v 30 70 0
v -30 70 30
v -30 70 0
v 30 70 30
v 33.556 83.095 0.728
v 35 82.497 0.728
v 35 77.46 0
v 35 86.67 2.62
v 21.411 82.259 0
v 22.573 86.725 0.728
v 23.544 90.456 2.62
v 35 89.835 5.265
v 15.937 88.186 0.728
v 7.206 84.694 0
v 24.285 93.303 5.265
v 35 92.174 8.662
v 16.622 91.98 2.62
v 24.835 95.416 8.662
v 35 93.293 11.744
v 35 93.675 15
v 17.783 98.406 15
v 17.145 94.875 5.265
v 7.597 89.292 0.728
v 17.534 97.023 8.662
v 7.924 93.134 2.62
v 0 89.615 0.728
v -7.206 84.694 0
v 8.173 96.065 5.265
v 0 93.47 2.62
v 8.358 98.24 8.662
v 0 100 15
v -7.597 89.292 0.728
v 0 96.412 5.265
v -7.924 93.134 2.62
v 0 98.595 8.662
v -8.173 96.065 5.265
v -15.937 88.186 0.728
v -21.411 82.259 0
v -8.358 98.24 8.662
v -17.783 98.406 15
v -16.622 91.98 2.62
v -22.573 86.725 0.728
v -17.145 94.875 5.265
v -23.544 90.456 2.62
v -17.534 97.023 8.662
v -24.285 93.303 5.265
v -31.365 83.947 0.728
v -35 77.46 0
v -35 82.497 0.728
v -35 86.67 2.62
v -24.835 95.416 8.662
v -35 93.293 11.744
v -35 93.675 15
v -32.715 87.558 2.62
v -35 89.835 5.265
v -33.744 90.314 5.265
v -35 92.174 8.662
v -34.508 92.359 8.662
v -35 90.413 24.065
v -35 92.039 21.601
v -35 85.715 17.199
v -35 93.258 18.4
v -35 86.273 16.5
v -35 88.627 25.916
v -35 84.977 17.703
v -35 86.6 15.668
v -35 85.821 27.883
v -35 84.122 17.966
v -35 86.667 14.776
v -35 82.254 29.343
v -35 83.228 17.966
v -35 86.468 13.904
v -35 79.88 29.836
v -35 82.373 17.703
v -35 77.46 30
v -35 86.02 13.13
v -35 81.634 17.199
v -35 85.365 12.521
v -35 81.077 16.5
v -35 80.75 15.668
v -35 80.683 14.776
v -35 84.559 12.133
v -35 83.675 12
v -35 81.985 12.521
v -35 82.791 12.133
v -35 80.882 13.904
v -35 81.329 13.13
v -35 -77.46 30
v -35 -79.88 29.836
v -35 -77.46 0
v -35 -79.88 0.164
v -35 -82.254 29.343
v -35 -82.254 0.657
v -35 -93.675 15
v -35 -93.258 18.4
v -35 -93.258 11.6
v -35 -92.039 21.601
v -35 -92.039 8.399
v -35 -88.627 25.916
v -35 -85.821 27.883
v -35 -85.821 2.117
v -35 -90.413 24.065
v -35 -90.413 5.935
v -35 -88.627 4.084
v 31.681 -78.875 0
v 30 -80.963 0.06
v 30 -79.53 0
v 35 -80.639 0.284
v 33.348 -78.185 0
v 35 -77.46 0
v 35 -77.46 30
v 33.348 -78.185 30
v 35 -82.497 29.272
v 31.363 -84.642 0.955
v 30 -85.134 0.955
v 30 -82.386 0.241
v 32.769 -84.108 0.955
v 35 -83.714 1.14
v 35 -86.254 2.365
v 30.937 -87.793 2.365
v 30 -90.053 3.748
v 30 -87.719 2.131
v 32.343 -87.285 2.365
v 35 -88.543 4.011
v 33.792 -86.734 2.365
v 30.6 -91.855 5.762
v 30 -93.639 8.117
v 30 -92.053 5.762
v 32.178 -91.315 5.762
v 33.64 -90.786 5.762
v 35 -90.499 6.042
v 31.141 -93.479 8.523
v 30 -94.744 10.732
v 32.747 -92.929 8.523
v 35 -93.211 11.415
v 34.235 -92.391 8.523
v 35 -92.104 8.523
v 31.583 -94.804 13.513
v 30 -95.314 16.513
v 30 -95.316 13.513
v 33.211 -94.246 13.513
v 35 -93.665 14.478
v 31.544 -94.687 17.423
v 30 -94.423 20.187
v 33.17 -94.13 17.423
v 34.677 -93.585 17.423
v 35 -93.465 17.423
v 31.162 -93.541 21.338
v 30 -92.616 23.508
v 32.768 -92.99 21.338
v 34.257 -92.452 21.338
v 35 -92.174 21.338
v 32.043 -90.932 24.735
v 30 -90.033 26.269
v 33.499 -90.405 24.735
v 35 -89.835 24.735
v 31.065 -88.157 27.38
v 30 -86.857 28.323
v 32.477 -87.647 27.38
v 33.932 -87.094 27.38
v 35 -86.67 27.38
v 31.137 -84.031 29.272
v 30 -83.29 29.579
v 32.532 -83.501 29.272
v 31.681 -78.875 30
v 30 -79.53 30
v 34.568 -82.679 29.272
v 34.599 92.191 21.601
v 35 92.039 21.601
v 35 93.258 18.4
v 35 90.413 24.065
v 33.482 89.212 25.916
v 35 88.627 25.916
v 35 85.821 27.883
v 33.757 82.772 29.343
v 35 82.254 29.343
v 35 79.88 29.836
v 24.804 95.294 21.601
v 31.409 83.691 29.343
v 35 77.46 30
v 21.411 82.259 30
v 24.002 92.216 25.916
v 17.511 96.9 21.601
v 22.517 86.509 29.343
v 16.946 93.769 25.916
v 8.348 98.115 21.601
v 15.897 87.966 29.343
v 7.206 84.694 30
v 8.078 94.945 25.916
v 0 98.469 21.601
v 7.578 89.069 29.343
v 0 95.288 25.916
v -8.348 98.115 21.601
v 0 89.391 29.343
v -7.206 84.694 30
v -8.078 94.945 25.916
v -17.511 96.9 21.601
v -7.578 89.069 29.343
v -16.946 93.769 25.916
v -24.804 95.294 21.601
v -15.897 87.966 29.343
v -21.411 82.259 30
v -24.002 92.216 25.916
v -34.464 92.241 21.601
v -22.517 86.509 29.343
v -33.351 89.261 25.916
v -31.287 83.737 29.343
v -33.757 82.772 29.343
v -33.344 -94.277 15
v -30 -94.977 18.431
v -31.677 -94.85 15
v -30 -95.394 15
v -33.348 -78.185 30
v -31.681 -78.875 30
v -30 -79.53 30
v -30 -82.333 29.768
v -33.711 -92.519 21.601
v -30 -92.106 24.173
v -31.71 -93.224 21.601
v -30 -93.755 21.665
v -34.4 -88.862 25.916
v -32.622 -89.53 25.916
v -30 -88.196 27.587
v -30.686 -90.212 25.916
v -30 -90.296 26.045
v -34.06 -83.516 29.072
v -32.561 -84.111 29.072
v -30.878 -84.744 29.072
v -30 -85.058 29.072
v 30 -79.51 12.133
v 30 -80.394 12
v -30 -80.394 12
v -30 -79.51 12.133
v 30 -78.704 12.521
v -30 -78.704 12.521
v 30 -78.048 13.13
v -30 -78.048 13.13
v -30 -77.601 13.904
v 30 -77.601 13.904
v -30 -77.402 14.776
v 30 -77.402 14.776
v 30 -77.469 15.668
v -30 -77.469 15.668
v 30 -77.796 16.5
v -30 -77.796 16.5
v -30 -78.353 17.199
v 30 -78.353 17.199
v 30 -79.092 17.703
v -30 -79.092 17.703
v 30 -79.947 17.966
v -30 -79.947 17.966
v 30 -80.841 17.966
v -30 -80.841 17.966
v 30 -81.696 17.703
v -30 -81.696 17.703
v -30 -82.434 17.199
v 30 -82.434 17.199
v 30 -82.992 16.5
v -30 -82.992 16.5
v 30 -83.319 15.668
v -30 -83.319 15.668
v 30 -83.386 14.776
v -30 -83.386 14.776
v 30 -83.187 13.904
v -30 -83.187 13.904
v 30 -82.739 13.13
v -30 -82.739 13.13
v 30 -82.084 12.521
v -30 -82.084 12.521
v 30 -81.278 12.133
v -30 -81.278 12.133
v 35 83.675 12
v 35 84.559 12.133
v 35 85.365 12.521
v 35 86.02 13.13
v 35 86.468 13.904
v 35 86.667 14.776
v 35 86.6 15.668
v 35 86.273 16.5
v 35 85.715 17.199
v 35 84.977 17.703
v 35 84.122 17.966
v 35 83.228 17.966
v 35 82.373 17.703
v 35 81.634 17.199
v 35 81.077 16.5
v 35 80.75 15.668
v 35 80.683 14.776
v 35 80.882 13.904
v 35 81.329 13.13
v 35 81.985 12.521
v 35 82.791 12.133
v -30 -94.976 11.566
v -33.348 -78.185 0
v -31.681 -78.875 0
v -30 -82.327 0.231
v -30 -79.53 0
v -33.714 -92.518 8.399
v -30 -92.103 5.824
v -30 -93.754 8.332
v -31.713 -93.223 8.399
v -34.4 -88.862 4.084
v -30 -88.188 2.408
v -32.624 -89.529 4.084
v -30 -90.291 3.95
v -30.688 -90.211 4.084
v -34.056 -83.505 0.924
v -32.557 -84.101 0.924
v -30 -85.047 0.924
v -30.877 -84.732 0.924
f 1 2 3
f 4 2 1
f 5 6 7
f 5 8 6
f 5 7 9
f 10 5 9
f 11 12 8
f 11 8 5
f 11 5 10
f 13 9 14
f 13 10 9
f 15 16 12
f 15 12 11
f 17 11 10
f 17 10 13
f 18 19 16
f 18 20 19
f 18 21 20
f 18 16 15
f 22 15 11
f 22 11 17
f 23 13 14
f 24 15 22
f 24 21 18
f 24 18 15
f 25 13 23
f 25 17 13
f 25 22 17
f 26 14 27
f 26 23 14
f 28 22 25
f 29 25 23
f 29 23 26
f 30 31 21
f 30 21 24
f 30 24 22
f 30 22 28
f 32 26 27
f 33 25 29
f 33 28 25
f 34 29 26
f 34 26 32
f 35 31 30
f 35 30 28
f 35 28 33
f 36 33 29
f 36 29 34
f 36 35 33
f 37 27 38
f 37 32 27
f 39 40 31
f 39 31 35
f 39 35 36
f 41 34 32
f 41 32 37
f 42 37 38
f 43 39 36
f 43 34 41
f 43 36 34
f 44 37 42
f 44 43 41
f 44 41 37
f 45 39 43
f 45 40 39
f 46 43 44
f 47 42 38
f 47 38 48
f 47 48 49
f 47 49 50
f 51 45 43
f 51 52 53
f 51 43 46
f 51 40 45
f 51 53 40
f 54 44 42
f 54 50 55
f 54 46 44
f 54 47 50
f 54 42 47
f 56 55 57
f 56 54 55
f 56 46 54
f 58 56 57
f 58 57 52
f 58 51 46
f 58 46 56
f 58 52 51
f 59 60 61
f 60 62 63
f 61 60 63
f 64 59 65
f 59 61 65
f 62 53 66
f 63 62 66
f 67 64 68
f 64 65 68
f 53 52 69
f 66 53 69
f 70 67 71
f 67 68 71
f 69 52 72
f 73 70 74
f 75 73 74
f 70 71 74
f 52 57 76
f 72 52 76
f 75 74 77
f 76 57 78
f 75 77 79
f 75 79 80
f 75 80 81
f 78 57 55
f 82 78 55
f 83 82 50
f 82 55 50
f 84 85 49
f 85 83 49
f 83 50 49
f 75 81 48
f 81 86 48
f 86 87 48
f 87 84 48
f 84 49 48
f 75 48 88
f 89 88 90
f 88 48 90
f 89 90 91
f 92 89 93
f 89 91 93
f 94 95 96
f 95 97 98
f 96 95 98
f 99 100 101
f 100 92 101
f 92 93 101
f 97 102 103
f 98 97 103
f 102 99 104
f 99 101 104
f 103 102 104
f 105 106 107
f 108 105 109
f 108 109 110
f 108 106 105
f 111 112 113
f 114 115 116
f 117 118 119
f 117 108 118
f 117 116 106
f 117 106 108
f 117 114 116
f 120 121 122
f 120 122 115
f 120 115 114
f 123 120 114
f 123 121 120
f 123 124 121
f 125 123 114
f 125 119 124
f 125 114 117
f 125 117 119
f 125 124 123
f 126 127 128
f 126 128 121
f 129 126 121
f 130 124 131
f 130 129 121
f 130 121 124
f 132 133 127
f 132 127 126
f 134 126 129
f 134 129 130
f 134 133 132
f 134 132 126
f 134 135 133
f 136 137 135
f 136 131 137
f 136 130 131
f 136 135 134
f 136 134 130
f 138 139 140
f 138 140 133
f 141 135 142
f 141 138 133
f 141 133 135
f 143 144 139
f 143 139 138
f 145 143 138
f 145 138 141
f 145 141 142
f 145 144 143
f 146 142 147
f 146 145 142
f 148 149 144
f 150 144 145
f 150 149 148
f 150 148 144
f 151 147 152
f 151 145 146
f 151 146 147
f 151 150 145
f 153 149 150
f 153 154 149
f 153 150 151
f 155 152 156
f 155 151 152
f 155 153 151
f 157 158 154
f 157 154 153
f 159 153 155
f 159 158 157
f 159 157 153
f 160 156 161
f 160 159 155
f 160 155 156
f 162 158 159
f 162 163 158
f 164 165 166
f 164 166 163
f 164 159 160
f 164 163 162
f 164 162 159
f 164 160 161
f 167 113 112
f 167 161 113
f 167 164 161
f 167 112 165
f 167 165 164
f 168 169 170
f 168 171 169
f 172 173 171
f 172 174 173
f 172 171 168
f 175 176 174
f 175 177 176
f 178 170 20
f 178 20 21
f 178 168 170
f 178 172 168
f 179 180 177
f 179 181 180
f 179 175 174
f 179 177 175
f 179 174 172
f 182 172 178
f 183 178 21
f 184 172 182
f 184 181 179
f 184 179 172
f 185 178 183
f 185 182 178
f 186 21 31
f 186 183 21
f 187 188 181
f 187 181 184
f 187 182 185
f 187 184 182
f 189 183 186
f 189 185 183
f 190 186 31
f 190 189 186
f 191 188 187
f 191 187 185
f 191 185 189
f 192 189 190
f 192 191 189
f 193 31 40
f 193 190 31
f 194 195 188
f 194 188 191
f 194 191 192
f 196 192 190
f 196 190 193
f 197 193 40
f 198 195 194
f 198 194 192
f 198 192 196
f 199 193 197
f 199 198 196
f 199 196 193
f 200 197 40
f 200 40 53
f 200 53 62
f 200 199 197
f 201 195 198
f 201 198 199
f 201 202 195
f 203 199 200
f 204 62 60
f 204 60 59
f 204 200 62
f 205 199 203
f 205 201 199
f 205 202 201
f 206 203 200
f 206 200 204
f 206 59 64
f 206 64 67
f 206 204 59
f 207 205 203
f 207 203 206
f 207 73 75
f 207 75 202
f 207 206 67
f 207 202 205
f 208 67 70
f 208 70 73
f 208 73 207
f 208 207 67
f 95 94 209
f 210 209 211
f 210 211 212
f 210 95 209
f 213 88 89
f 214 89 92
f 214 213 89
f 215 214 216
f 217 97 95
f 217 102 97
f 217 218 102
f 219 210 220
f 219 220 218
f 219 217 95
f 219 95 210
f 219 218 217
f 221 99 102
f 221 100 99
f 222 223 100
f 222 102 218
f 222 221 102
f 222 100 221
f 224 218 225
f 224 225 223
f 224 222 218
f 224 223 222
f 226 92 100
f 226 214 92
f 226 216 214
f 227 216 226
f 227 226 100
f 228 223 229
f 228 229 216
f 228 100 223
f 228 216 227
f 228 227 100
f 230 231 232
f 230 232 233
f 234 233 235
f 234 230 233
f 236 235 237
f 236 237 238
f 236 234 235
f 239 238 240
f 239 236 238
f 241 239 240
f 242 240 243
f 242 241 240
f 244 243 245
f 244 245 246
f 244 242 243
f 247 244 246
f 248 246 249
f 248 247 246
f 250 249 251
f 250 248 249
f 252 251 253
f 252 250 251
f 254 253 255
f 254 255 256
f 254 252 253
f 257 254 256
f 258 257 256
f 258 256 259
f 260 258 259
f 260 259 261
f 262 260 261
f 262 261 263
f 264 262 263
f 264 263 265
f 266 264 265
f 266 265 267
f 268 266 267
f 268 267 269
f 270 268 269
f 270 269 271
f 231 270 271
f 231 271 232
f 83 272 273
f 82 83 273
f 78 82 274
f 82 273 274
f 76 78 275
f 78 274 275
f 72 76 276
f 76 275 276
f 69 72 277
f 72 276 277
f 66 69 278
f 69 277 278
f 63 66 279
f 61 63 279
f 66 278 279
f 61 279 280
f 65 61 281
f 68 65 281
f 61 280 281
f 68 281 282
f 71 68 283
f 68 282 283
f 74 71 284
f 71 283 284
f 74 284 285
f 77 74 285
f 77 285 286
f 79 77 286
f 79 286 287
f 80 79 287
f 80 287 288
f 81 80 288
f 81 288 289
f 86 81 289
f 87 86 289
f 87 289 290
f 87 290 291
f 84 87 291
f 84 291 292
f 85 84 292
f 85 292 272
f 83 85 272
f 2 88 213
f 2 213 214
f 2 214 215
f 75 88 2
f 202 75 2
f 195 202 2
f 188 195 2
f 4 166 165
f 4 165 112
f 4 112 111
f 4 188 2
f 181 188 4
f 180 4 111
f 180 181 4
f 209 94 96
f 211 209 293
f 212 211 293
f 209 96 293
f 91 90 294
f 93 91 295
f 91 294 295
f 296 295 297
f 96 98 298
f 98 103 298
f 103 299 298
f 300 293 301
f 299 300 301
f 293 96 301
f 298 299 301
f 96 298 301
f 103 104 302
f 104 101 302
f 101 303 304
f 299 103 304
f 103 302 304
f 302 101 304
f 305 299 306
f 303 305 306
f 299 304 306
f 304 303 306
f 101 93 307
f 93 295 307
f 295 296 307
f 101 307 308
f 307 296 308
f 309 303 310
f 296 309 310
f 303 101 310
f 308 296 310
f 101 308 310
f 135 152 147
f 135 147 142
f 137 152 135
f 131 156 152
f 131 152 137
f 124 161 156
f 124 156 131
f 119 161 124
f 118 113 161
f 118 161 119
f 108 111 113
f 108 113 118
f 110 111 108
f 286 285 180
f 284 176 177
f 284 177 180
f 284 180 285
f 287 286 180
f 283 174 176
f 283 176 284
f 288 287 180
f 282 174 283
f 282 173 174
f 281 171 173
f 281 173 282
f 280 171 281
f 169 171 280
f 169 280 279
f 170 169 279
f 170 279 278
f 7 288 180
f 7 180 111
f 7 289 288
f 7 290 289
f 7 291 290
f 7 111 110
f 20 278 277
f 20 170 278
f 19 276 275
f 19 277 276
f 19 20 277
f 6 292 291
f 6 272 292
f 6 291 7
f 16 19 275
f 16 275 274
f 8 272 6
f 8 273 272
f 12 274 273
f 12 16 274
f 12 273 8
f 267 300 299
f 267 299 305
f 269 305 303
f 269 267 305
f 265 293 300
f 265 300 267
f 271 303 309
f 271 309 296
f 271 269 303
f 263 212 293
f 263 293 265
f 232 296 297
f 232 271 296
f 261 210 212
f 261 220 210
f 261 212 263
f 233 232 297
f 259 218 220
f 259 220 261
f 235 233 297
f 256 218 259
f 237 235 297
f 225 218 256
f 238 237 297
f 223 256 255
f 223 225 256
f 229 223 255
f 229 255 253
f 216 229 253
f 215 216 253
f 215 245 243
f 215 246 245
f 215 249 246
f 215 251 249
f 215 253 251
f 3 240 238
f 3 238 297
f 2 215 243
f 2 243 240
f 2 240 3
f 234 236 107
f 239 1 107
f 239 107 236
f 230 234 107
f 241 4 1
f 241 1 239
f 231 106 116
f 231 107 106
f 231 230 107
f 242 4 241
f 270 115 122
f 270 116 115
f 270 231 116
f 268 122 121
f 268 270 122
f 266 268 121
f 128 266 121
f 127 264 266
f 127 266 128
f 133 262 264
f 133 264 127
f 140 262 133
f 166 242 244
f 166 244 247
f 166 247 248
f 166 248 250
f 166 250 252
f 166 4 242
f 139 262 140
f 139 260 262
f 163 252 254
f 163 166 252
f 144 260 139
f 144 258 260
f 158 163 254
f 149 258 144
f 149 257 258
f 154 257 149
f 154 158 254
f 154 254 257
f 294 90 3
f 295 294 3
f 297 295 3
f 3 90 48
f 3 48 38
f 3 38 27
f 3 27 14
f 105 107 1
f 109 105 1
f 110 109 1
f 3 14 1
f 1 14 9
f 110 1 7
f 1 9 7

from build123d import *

# Parameters (mm, degrees)
EXTRUDE_1_DEPTH     = 30
SKETCH_2_R          = 3
CUT_EXTRUDE_1_DEPTH = 192
FILLET_1_R          = 15
CUT_EXTRUDE_2_DEPTH = 192
SKETCH_4_R          = 3
EXTRUDE_2_DEPTH     = 66
FILLET_2_R          = 15
FILLET_3_R          = 15
FILLET_4_R          = 15
FILLET_5_R          = 15
FILLET_8_ANGLE      = 6.858136


with BuildPart() as part:
    # 草图1 → 凸台-拉伸1 (new body)
    with BuildSketch(Plane.XY):
        with BuildLine():
            Line((35, -93.674969976), (35, 93.674969976))
            ThreePointArc((35, 93.674969976), (0, 100), (-35, 93.674969976))
            Line((-35, 93.674969976), (-35, -93.674969976))
            ThreePointArc((-35, -93.674969976), (0, -100), (35, -93.674969976))
        make_face()
    extrude(amount=EXTRUDE_1_DEPTH)

    # 草图2 → 切除-拉伸1 (cut)
    with BuildSketch(Plane(origin=(35, 0, 0), x_dir=(0, 0, -1), z_dir=(1, 0, 0))):
        with Locations((-15, 83.674969976)):
            Circle(SKETCH_2_R)
    extrude(amount=-CUT_EXTRUDE_1_DEPTH, mode=Mode.SUBTRACT)

    # 圆角1
    fillet_1_edges = [part.edges().sort_by_distance(p)[0] for p in [
        (0, 100, 0),
    ]]
    fillet(fillet_1_edges, radius=FILLET_1_R)

    # 草图3 → 切除-拉伸2 (cut)
    with BuildSketch(Plane.XY.offset(30)):
        Polygon((0, -100), (-30, -100), (-30, 70), (30, 70), (30, -100), align=None)
    extrude(amount=-CUT_EXTRUDE_2_DEPTH, mode=Mode.SUBTRACT)

    # 草图4 → 凸台-拉伸2 (add)
    with BuildSketch(Plane(origin=(35, 0, 0), x_dir=(0, 0, -1), z_dir=(1, 0, 0))):
        with Locations((-15, -80.393920142)):
            Circle(SKETCH_4_R)
    extrude(amount=-EXTRUDE_2_DEPTH)

    # 圆角2
    fillet_2_edges = [part.edges().sort_by_distance(p)[0] for p in [
        (0, 100, 30),
    ]]
    fillet(fillet_2_edges, radius=FILLET_2_R - 0.0001)  # a hair under: the kernel refuses the full size

    # 圆角3
    # the kernel refuses this fillet: 15 mm, written as the material it takes off along each edge
    with BuildSketch(Plane(origin=(0, 0, 30), x_dir=(-0.07024960756428812, -0.9975294444962832, 0), z_dir=(-0.9975294444962832, 0.07024960756428812, 0))) as fillet_3_piece_1:
        with BuildLine():
            CenterArc((100 - FILLET_3_R, -FILLET_3_R), FILLET_3_R, 0, 90)
            Line((100, -FILLET_3_R), (100, 0))
            Line((100, 0), (100 - FILLET_3_R, 0))
        make_face()
    revolve(axis=Axis((0, 0, 30), (0, 0, 1)), revolution_arc=46.001566182, mode=Mode.SUBTRACT)

    # 圆角4
    # the kernel refuses this fillet: 15 mm, written as the material it takes off along each edge
    with BuildSketch(Plane(origin=(0, 0, 0), x_dir=(-0.07024960756429688, -0.9975294444962826, 0), z_dir=(-0.9975294444962826, 0.07024960756429688, 0))) as fillet_4_piece_1:
        with BuildLine():
            CenterArc((100 - FILLET_4_R, FILLET_4_R), FILLET_4_R, 270, 90)
            Line((100, FILLET_4_R), (100, 0))
            Line((100, 0), (100 - FILLET_4_R, 0))
        make_face()
    revolve(axis=Axis((0, 0, 0), (0, 0, 1)), revolution_arc=46.001566182, mode=Mode.SUBTRACT)

    # 圆角5
    # the kernel refuses this fillet: 15 mm, written as the material it takes off along each edge
    with BuildSketch(Plane(origin=(0, 0, 30), x_dir=(-0.668783476201052, -0.7434572361342896, 0), z_dir=(-0.7434572361342896, 0.668783476201052, 0))) as fillet_5_piece_1:
        with BuildLine():
            CenterArc((100 - FILLET_5_R, -FILLET_5_R), FILLET_5_R, 0, 90)
            Line((100 - FILLET_5_R, 0), (100, 0))
            Line((100, 0), (100, -FILLET_5_R))
        make_face()
    revolve(axis=Axis((0, 0, 30), (0, 0, 1)), revolution_arc=46.001566182, mode=Mode.SUBTRACT)

    # 圆角8: read off the stored shape, not the designer's step
    # 圆角8 outline → 圆角8 (revolve, cut)
    with BuildSketch(Plane(origin=(0, 0, 0), x_dir=(-0.4117647058823542, -0.911290199107627, 0), z_dir=(-0.911290199107627, 0.4117647058823542, 0))):
        with BuildLine():
            ThreePointArc((100, 15), (95.606601718, 4.393398282), (85, 0))
            Line((85, 0), (100, 0))
            Line((100, 0), (100, 15))
        make_face()
    revolve(axis=Axis((0, 0, 0), (0, 0, 1)), revolution_arc=FILLET_8_ANGLE, mode=Mode.SUBTRACT)


solid = part.part
